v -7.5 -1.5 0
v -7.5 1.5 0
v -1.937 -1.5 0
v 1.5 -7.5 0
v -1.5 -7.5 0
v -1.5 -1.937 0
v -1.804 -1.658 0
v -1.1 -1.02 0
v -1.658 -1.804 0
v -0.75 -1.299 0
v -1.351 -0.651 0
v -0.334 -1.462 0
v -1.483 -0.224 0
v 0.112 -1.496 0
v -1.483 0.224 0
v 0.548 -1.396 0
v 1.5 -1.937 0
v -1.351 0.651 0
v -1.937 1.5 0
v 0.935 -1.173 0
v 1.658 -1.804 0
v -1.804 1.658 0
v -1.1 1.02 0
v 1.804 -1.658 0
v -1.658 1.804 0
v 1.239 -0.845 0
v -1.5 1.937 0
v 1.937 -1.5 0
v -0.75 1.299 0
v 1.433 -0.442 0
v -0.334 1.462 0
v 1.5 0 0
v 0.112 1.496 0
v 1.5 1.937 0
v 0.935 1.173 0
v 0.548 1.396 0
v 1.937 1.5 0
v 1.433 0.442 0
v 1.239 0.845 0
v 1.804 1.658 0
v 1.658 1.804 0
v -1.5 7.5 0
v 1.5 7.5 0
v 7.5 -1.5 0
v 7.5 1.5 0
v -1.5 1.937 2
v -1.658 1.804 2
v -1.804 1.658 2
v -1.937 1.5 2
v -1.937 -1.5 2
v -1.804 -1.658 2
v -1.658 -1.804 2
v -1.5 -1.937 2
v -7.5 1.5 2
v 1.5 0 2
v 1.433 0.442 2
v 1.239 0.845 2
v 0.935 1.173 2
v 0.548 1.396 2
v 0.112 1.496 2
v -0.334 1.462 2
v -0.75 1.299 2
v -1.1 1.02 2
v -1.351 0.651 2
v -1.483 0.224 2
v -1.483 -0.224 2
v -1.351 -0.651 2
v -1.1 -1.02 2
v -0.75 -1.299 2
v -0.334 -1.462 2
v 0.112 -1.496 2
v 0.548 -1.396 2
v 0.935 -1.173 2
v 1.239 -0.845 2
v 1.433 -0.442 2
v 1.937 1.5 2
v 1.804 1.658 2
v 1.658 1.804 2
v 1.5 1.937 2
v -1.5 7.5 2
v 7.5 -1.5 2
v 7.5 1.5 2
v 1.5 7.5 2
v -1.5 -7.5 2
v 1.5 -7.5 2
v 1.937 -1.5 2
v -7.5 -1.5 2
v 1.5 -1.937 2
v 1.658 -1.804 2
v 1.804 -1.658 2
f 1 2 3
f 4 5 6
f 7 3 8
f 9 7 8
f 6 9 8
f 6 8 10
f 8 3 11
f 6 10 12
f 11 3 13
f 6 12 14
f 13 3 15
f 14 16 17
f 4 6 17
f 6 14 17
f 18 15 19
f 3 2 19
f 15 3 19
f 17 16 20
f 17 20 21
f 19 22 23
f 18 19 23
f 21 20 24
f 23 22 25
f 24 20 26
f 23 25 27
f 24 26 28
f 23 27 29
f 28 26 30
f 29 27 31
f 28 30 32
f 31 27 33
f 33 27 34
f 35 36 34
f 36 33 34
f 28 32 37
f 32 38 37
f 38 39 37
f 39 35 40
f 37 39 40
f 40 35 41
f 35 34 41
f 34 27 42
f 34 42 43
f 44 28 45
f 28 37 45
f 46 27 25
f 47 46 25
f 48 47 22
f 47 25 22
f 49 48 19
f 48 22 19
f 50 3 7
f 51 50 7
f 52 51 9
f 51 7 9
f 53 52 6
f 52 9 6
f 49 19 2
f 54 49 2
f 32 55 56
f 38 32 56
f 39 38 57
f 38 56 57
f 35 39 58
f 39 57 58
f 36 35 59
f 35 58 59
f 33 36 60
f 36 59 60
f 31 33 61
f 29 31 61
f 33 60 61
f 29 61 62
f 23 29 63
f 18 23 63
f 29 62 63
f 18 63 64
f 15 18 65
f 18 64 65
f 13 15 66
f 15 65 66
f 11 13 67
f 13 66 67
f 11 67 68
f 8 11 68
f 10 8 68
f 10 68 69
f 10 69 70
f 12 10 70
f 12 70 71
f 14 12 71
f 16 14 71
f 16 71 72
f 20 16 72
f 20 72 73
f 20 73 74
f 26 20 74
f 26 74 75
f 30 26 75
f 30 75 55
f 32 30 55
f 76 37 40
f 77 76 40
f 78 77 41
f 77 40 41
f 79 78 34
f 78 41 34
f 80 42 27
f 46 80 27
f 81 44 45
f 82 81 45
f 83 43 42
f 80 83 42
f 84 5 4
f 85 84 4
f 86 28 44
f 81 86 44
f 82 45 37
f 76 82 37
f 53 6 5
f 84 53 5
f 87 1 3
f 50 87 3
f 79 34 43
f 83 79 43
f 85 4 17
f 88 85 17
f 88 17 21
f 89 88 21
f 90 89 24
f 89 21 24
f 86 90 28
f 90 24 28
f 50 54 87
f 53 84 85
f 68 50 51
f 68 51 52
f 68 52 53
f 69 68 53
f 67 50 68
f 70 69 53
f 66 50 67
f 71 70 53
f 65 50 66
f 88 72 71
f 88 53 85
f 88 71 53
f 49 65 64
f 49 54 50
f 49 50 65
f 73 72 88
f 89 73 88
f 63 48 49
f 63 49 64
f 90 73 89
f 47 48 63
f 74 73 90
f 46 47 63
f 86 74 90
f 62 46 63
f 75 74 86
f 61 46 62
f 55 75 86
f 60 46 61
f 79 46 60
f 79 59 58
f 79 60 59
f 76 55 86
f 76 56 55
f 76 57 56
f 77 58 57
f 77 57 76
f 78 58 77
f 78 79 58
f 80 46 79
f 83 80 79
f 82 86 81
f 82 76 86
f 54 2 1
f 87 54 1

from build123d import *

# Parameters (mm, degrees)
F0_W     = 3
F0_H     = 3
F1_DEPTH = 2
F2_R     = 1.5
F3_DEPTH = 2.001


with BuildPart() as f1:
    # F0 (on Top) → F1 (new body)
    with BuildSketch(Plane.XY):
        with BuildLine():
            ThreePointArc((-1.9371370628, -1.5), (-2.45, 0), (-1.9371370628, 1.5))
            Line((-1.9371370628, 1.5), (-7.5, 1.5))
            Line((-7.5, 1.5), (-7.5, -1.5))
            Line((-7.5, -1.5), (-1.9371370628, -1.5))
        make_face()
        Rectangle(F0_W, F0_H)
        with BuildLine():
            Line((-1.5, -1.5), (-1.5, 1.5))
            Line((-1.5, 1.5), (-1.9371370628, 1.5))
            ThreePointArc((-1.9371370628, 1.5), (-2.45, 0), (-1.9371370628, -1.5))
            Line((-1.9371370628, -1.5), (-1.5, -1.5))
        make_face()
        with BuildLine():
            ThreePointArc((1.9371370628, 1.5), (2.3182413381, 0.7926267079), (2.45, 0))
            ThreePointArc((2.45, 0), (2.3182413381, -0.7926267079), (1.9371370628, -1.5))
            Line((1.9371370628, -1.5), (7.5, -1.5))
            Line((7.5, -1.5), (7.5, 1.5))
            Line((7.5, 1.5), (1.9371370628, 1.5))
        make_face()
        with BuildLine():
            Line((1.5, -7.5), (1.5, -1.9371370628))
            ThreePointArc((1.5, -1.9371370628), (0, -2.45), (-1.5, -1.9371370628))
            Line((-1.5, -1.9371370628), (-1.5, -7.5))
            Line((-1.5, -7.5), (1.5, -7.5))
        make_face()
        with BuildLine():
            Line((1.5, 1.5), (1.5, 1.9371370628))
            ThreePointArc((1.5, 1.9371370628), (0, 2.45), (-1.5, 1.9371370628))
            Line((-1.5, 1.9371370628), (-1.5, 1.5))
            Line((-1.5, 1.5), (1.5, 1.5))
        make_face()
        with BuildLine():
            ThreePointArc((1.9371370628, -1.5), (2.3182413381, -0.7926267079), (2.45, 0))
            ThreePointArc((2.45, 0), (2.3182413381, 0.7926267079), (1.9371370628, 1.5))
            Line((1.9371370628, 1.5), (1.5, 1.5))
            Line((1.5, 1.5), (1.5, -1.5))
            Line((1.5, -1.5), (1.9371370628, -1.5))
        make_face()
        with BuildLine():
            ThreePointArc((-1.5, 1.9371370628), (0, 2.45), (1.5, 1.9371370628))
            Line((1.5, 1.9371370628), (1.5, 7.5))
            Line((1.5, 7.5), (-1.5, 7.5))
            Line((-1.5, 7.5), (-1.5, 1.9371370628))
        make_face()
        with BuildLine():
            ThreePointArc((-1.5, -1.9371370628), (0, -2.45), (1.5, -1.9371370628))
            Line((1.5, -1.9371370628), (1.5, -1.5))
            Line((1.5, -1.5), (-1.5, -1.5))
            Line((-1.5, -1.5), (-1.5, -1.9371370628))
        make_face()
        with BuildLine():
            ThreePointArc((-1.9371370628, -1.5), (-1.7324116139, -1.7324116139), (-1.5, -1.9371370628))
            Line((-1.5, -1.9371370628), (-1.5, -1.5))
            Line((-1.5, -1.5), (-1.9371370628, -1.5))
        make_face()
        with BuildLine():
            Line((1.5, 1.5), (1.9371370628, 1.5))
            ThreePointArc((1.9371370628, 1.5), (1.7324116139, 1.7324116139), (1.5, 1.9371370628))
            Line((1.5, 1.9371370628), (1.5, 1.5))
        make_face()
        with BuildLine():
            ThreePointArc((1.5, -1.9371370628), (1.7324116139, -1.7324116139), (1.9371370628, -1.5))
            Line((1.9371370628, -1.5), (1.5, -1.5))
            Line((1.5, -1.5), (1.5, -1.9371370628))
        make_face()
        with BuildLine():
            Line((-1.5, 1.5), (-1.5, 1.9371370628))
            ThreePointArc((-1.5, 1.9371370628), (-1.7324116139, 1.7324116139), (-1.9371370628, 1.5))
            Line((-1.9371370628, 1.5), (-1.5, 1.5))
        make_face()
    extrude(amount=F1_DEPTH)

    # F2 (on face) → F3 (cut, through all)
    with BuildSketch(Plane.XY.offset(2)):
        Circle(F2_R)
    extrude(amount=-F3_DEPTH, mode=Mode.SUBTRACT)


solid = f1.part
